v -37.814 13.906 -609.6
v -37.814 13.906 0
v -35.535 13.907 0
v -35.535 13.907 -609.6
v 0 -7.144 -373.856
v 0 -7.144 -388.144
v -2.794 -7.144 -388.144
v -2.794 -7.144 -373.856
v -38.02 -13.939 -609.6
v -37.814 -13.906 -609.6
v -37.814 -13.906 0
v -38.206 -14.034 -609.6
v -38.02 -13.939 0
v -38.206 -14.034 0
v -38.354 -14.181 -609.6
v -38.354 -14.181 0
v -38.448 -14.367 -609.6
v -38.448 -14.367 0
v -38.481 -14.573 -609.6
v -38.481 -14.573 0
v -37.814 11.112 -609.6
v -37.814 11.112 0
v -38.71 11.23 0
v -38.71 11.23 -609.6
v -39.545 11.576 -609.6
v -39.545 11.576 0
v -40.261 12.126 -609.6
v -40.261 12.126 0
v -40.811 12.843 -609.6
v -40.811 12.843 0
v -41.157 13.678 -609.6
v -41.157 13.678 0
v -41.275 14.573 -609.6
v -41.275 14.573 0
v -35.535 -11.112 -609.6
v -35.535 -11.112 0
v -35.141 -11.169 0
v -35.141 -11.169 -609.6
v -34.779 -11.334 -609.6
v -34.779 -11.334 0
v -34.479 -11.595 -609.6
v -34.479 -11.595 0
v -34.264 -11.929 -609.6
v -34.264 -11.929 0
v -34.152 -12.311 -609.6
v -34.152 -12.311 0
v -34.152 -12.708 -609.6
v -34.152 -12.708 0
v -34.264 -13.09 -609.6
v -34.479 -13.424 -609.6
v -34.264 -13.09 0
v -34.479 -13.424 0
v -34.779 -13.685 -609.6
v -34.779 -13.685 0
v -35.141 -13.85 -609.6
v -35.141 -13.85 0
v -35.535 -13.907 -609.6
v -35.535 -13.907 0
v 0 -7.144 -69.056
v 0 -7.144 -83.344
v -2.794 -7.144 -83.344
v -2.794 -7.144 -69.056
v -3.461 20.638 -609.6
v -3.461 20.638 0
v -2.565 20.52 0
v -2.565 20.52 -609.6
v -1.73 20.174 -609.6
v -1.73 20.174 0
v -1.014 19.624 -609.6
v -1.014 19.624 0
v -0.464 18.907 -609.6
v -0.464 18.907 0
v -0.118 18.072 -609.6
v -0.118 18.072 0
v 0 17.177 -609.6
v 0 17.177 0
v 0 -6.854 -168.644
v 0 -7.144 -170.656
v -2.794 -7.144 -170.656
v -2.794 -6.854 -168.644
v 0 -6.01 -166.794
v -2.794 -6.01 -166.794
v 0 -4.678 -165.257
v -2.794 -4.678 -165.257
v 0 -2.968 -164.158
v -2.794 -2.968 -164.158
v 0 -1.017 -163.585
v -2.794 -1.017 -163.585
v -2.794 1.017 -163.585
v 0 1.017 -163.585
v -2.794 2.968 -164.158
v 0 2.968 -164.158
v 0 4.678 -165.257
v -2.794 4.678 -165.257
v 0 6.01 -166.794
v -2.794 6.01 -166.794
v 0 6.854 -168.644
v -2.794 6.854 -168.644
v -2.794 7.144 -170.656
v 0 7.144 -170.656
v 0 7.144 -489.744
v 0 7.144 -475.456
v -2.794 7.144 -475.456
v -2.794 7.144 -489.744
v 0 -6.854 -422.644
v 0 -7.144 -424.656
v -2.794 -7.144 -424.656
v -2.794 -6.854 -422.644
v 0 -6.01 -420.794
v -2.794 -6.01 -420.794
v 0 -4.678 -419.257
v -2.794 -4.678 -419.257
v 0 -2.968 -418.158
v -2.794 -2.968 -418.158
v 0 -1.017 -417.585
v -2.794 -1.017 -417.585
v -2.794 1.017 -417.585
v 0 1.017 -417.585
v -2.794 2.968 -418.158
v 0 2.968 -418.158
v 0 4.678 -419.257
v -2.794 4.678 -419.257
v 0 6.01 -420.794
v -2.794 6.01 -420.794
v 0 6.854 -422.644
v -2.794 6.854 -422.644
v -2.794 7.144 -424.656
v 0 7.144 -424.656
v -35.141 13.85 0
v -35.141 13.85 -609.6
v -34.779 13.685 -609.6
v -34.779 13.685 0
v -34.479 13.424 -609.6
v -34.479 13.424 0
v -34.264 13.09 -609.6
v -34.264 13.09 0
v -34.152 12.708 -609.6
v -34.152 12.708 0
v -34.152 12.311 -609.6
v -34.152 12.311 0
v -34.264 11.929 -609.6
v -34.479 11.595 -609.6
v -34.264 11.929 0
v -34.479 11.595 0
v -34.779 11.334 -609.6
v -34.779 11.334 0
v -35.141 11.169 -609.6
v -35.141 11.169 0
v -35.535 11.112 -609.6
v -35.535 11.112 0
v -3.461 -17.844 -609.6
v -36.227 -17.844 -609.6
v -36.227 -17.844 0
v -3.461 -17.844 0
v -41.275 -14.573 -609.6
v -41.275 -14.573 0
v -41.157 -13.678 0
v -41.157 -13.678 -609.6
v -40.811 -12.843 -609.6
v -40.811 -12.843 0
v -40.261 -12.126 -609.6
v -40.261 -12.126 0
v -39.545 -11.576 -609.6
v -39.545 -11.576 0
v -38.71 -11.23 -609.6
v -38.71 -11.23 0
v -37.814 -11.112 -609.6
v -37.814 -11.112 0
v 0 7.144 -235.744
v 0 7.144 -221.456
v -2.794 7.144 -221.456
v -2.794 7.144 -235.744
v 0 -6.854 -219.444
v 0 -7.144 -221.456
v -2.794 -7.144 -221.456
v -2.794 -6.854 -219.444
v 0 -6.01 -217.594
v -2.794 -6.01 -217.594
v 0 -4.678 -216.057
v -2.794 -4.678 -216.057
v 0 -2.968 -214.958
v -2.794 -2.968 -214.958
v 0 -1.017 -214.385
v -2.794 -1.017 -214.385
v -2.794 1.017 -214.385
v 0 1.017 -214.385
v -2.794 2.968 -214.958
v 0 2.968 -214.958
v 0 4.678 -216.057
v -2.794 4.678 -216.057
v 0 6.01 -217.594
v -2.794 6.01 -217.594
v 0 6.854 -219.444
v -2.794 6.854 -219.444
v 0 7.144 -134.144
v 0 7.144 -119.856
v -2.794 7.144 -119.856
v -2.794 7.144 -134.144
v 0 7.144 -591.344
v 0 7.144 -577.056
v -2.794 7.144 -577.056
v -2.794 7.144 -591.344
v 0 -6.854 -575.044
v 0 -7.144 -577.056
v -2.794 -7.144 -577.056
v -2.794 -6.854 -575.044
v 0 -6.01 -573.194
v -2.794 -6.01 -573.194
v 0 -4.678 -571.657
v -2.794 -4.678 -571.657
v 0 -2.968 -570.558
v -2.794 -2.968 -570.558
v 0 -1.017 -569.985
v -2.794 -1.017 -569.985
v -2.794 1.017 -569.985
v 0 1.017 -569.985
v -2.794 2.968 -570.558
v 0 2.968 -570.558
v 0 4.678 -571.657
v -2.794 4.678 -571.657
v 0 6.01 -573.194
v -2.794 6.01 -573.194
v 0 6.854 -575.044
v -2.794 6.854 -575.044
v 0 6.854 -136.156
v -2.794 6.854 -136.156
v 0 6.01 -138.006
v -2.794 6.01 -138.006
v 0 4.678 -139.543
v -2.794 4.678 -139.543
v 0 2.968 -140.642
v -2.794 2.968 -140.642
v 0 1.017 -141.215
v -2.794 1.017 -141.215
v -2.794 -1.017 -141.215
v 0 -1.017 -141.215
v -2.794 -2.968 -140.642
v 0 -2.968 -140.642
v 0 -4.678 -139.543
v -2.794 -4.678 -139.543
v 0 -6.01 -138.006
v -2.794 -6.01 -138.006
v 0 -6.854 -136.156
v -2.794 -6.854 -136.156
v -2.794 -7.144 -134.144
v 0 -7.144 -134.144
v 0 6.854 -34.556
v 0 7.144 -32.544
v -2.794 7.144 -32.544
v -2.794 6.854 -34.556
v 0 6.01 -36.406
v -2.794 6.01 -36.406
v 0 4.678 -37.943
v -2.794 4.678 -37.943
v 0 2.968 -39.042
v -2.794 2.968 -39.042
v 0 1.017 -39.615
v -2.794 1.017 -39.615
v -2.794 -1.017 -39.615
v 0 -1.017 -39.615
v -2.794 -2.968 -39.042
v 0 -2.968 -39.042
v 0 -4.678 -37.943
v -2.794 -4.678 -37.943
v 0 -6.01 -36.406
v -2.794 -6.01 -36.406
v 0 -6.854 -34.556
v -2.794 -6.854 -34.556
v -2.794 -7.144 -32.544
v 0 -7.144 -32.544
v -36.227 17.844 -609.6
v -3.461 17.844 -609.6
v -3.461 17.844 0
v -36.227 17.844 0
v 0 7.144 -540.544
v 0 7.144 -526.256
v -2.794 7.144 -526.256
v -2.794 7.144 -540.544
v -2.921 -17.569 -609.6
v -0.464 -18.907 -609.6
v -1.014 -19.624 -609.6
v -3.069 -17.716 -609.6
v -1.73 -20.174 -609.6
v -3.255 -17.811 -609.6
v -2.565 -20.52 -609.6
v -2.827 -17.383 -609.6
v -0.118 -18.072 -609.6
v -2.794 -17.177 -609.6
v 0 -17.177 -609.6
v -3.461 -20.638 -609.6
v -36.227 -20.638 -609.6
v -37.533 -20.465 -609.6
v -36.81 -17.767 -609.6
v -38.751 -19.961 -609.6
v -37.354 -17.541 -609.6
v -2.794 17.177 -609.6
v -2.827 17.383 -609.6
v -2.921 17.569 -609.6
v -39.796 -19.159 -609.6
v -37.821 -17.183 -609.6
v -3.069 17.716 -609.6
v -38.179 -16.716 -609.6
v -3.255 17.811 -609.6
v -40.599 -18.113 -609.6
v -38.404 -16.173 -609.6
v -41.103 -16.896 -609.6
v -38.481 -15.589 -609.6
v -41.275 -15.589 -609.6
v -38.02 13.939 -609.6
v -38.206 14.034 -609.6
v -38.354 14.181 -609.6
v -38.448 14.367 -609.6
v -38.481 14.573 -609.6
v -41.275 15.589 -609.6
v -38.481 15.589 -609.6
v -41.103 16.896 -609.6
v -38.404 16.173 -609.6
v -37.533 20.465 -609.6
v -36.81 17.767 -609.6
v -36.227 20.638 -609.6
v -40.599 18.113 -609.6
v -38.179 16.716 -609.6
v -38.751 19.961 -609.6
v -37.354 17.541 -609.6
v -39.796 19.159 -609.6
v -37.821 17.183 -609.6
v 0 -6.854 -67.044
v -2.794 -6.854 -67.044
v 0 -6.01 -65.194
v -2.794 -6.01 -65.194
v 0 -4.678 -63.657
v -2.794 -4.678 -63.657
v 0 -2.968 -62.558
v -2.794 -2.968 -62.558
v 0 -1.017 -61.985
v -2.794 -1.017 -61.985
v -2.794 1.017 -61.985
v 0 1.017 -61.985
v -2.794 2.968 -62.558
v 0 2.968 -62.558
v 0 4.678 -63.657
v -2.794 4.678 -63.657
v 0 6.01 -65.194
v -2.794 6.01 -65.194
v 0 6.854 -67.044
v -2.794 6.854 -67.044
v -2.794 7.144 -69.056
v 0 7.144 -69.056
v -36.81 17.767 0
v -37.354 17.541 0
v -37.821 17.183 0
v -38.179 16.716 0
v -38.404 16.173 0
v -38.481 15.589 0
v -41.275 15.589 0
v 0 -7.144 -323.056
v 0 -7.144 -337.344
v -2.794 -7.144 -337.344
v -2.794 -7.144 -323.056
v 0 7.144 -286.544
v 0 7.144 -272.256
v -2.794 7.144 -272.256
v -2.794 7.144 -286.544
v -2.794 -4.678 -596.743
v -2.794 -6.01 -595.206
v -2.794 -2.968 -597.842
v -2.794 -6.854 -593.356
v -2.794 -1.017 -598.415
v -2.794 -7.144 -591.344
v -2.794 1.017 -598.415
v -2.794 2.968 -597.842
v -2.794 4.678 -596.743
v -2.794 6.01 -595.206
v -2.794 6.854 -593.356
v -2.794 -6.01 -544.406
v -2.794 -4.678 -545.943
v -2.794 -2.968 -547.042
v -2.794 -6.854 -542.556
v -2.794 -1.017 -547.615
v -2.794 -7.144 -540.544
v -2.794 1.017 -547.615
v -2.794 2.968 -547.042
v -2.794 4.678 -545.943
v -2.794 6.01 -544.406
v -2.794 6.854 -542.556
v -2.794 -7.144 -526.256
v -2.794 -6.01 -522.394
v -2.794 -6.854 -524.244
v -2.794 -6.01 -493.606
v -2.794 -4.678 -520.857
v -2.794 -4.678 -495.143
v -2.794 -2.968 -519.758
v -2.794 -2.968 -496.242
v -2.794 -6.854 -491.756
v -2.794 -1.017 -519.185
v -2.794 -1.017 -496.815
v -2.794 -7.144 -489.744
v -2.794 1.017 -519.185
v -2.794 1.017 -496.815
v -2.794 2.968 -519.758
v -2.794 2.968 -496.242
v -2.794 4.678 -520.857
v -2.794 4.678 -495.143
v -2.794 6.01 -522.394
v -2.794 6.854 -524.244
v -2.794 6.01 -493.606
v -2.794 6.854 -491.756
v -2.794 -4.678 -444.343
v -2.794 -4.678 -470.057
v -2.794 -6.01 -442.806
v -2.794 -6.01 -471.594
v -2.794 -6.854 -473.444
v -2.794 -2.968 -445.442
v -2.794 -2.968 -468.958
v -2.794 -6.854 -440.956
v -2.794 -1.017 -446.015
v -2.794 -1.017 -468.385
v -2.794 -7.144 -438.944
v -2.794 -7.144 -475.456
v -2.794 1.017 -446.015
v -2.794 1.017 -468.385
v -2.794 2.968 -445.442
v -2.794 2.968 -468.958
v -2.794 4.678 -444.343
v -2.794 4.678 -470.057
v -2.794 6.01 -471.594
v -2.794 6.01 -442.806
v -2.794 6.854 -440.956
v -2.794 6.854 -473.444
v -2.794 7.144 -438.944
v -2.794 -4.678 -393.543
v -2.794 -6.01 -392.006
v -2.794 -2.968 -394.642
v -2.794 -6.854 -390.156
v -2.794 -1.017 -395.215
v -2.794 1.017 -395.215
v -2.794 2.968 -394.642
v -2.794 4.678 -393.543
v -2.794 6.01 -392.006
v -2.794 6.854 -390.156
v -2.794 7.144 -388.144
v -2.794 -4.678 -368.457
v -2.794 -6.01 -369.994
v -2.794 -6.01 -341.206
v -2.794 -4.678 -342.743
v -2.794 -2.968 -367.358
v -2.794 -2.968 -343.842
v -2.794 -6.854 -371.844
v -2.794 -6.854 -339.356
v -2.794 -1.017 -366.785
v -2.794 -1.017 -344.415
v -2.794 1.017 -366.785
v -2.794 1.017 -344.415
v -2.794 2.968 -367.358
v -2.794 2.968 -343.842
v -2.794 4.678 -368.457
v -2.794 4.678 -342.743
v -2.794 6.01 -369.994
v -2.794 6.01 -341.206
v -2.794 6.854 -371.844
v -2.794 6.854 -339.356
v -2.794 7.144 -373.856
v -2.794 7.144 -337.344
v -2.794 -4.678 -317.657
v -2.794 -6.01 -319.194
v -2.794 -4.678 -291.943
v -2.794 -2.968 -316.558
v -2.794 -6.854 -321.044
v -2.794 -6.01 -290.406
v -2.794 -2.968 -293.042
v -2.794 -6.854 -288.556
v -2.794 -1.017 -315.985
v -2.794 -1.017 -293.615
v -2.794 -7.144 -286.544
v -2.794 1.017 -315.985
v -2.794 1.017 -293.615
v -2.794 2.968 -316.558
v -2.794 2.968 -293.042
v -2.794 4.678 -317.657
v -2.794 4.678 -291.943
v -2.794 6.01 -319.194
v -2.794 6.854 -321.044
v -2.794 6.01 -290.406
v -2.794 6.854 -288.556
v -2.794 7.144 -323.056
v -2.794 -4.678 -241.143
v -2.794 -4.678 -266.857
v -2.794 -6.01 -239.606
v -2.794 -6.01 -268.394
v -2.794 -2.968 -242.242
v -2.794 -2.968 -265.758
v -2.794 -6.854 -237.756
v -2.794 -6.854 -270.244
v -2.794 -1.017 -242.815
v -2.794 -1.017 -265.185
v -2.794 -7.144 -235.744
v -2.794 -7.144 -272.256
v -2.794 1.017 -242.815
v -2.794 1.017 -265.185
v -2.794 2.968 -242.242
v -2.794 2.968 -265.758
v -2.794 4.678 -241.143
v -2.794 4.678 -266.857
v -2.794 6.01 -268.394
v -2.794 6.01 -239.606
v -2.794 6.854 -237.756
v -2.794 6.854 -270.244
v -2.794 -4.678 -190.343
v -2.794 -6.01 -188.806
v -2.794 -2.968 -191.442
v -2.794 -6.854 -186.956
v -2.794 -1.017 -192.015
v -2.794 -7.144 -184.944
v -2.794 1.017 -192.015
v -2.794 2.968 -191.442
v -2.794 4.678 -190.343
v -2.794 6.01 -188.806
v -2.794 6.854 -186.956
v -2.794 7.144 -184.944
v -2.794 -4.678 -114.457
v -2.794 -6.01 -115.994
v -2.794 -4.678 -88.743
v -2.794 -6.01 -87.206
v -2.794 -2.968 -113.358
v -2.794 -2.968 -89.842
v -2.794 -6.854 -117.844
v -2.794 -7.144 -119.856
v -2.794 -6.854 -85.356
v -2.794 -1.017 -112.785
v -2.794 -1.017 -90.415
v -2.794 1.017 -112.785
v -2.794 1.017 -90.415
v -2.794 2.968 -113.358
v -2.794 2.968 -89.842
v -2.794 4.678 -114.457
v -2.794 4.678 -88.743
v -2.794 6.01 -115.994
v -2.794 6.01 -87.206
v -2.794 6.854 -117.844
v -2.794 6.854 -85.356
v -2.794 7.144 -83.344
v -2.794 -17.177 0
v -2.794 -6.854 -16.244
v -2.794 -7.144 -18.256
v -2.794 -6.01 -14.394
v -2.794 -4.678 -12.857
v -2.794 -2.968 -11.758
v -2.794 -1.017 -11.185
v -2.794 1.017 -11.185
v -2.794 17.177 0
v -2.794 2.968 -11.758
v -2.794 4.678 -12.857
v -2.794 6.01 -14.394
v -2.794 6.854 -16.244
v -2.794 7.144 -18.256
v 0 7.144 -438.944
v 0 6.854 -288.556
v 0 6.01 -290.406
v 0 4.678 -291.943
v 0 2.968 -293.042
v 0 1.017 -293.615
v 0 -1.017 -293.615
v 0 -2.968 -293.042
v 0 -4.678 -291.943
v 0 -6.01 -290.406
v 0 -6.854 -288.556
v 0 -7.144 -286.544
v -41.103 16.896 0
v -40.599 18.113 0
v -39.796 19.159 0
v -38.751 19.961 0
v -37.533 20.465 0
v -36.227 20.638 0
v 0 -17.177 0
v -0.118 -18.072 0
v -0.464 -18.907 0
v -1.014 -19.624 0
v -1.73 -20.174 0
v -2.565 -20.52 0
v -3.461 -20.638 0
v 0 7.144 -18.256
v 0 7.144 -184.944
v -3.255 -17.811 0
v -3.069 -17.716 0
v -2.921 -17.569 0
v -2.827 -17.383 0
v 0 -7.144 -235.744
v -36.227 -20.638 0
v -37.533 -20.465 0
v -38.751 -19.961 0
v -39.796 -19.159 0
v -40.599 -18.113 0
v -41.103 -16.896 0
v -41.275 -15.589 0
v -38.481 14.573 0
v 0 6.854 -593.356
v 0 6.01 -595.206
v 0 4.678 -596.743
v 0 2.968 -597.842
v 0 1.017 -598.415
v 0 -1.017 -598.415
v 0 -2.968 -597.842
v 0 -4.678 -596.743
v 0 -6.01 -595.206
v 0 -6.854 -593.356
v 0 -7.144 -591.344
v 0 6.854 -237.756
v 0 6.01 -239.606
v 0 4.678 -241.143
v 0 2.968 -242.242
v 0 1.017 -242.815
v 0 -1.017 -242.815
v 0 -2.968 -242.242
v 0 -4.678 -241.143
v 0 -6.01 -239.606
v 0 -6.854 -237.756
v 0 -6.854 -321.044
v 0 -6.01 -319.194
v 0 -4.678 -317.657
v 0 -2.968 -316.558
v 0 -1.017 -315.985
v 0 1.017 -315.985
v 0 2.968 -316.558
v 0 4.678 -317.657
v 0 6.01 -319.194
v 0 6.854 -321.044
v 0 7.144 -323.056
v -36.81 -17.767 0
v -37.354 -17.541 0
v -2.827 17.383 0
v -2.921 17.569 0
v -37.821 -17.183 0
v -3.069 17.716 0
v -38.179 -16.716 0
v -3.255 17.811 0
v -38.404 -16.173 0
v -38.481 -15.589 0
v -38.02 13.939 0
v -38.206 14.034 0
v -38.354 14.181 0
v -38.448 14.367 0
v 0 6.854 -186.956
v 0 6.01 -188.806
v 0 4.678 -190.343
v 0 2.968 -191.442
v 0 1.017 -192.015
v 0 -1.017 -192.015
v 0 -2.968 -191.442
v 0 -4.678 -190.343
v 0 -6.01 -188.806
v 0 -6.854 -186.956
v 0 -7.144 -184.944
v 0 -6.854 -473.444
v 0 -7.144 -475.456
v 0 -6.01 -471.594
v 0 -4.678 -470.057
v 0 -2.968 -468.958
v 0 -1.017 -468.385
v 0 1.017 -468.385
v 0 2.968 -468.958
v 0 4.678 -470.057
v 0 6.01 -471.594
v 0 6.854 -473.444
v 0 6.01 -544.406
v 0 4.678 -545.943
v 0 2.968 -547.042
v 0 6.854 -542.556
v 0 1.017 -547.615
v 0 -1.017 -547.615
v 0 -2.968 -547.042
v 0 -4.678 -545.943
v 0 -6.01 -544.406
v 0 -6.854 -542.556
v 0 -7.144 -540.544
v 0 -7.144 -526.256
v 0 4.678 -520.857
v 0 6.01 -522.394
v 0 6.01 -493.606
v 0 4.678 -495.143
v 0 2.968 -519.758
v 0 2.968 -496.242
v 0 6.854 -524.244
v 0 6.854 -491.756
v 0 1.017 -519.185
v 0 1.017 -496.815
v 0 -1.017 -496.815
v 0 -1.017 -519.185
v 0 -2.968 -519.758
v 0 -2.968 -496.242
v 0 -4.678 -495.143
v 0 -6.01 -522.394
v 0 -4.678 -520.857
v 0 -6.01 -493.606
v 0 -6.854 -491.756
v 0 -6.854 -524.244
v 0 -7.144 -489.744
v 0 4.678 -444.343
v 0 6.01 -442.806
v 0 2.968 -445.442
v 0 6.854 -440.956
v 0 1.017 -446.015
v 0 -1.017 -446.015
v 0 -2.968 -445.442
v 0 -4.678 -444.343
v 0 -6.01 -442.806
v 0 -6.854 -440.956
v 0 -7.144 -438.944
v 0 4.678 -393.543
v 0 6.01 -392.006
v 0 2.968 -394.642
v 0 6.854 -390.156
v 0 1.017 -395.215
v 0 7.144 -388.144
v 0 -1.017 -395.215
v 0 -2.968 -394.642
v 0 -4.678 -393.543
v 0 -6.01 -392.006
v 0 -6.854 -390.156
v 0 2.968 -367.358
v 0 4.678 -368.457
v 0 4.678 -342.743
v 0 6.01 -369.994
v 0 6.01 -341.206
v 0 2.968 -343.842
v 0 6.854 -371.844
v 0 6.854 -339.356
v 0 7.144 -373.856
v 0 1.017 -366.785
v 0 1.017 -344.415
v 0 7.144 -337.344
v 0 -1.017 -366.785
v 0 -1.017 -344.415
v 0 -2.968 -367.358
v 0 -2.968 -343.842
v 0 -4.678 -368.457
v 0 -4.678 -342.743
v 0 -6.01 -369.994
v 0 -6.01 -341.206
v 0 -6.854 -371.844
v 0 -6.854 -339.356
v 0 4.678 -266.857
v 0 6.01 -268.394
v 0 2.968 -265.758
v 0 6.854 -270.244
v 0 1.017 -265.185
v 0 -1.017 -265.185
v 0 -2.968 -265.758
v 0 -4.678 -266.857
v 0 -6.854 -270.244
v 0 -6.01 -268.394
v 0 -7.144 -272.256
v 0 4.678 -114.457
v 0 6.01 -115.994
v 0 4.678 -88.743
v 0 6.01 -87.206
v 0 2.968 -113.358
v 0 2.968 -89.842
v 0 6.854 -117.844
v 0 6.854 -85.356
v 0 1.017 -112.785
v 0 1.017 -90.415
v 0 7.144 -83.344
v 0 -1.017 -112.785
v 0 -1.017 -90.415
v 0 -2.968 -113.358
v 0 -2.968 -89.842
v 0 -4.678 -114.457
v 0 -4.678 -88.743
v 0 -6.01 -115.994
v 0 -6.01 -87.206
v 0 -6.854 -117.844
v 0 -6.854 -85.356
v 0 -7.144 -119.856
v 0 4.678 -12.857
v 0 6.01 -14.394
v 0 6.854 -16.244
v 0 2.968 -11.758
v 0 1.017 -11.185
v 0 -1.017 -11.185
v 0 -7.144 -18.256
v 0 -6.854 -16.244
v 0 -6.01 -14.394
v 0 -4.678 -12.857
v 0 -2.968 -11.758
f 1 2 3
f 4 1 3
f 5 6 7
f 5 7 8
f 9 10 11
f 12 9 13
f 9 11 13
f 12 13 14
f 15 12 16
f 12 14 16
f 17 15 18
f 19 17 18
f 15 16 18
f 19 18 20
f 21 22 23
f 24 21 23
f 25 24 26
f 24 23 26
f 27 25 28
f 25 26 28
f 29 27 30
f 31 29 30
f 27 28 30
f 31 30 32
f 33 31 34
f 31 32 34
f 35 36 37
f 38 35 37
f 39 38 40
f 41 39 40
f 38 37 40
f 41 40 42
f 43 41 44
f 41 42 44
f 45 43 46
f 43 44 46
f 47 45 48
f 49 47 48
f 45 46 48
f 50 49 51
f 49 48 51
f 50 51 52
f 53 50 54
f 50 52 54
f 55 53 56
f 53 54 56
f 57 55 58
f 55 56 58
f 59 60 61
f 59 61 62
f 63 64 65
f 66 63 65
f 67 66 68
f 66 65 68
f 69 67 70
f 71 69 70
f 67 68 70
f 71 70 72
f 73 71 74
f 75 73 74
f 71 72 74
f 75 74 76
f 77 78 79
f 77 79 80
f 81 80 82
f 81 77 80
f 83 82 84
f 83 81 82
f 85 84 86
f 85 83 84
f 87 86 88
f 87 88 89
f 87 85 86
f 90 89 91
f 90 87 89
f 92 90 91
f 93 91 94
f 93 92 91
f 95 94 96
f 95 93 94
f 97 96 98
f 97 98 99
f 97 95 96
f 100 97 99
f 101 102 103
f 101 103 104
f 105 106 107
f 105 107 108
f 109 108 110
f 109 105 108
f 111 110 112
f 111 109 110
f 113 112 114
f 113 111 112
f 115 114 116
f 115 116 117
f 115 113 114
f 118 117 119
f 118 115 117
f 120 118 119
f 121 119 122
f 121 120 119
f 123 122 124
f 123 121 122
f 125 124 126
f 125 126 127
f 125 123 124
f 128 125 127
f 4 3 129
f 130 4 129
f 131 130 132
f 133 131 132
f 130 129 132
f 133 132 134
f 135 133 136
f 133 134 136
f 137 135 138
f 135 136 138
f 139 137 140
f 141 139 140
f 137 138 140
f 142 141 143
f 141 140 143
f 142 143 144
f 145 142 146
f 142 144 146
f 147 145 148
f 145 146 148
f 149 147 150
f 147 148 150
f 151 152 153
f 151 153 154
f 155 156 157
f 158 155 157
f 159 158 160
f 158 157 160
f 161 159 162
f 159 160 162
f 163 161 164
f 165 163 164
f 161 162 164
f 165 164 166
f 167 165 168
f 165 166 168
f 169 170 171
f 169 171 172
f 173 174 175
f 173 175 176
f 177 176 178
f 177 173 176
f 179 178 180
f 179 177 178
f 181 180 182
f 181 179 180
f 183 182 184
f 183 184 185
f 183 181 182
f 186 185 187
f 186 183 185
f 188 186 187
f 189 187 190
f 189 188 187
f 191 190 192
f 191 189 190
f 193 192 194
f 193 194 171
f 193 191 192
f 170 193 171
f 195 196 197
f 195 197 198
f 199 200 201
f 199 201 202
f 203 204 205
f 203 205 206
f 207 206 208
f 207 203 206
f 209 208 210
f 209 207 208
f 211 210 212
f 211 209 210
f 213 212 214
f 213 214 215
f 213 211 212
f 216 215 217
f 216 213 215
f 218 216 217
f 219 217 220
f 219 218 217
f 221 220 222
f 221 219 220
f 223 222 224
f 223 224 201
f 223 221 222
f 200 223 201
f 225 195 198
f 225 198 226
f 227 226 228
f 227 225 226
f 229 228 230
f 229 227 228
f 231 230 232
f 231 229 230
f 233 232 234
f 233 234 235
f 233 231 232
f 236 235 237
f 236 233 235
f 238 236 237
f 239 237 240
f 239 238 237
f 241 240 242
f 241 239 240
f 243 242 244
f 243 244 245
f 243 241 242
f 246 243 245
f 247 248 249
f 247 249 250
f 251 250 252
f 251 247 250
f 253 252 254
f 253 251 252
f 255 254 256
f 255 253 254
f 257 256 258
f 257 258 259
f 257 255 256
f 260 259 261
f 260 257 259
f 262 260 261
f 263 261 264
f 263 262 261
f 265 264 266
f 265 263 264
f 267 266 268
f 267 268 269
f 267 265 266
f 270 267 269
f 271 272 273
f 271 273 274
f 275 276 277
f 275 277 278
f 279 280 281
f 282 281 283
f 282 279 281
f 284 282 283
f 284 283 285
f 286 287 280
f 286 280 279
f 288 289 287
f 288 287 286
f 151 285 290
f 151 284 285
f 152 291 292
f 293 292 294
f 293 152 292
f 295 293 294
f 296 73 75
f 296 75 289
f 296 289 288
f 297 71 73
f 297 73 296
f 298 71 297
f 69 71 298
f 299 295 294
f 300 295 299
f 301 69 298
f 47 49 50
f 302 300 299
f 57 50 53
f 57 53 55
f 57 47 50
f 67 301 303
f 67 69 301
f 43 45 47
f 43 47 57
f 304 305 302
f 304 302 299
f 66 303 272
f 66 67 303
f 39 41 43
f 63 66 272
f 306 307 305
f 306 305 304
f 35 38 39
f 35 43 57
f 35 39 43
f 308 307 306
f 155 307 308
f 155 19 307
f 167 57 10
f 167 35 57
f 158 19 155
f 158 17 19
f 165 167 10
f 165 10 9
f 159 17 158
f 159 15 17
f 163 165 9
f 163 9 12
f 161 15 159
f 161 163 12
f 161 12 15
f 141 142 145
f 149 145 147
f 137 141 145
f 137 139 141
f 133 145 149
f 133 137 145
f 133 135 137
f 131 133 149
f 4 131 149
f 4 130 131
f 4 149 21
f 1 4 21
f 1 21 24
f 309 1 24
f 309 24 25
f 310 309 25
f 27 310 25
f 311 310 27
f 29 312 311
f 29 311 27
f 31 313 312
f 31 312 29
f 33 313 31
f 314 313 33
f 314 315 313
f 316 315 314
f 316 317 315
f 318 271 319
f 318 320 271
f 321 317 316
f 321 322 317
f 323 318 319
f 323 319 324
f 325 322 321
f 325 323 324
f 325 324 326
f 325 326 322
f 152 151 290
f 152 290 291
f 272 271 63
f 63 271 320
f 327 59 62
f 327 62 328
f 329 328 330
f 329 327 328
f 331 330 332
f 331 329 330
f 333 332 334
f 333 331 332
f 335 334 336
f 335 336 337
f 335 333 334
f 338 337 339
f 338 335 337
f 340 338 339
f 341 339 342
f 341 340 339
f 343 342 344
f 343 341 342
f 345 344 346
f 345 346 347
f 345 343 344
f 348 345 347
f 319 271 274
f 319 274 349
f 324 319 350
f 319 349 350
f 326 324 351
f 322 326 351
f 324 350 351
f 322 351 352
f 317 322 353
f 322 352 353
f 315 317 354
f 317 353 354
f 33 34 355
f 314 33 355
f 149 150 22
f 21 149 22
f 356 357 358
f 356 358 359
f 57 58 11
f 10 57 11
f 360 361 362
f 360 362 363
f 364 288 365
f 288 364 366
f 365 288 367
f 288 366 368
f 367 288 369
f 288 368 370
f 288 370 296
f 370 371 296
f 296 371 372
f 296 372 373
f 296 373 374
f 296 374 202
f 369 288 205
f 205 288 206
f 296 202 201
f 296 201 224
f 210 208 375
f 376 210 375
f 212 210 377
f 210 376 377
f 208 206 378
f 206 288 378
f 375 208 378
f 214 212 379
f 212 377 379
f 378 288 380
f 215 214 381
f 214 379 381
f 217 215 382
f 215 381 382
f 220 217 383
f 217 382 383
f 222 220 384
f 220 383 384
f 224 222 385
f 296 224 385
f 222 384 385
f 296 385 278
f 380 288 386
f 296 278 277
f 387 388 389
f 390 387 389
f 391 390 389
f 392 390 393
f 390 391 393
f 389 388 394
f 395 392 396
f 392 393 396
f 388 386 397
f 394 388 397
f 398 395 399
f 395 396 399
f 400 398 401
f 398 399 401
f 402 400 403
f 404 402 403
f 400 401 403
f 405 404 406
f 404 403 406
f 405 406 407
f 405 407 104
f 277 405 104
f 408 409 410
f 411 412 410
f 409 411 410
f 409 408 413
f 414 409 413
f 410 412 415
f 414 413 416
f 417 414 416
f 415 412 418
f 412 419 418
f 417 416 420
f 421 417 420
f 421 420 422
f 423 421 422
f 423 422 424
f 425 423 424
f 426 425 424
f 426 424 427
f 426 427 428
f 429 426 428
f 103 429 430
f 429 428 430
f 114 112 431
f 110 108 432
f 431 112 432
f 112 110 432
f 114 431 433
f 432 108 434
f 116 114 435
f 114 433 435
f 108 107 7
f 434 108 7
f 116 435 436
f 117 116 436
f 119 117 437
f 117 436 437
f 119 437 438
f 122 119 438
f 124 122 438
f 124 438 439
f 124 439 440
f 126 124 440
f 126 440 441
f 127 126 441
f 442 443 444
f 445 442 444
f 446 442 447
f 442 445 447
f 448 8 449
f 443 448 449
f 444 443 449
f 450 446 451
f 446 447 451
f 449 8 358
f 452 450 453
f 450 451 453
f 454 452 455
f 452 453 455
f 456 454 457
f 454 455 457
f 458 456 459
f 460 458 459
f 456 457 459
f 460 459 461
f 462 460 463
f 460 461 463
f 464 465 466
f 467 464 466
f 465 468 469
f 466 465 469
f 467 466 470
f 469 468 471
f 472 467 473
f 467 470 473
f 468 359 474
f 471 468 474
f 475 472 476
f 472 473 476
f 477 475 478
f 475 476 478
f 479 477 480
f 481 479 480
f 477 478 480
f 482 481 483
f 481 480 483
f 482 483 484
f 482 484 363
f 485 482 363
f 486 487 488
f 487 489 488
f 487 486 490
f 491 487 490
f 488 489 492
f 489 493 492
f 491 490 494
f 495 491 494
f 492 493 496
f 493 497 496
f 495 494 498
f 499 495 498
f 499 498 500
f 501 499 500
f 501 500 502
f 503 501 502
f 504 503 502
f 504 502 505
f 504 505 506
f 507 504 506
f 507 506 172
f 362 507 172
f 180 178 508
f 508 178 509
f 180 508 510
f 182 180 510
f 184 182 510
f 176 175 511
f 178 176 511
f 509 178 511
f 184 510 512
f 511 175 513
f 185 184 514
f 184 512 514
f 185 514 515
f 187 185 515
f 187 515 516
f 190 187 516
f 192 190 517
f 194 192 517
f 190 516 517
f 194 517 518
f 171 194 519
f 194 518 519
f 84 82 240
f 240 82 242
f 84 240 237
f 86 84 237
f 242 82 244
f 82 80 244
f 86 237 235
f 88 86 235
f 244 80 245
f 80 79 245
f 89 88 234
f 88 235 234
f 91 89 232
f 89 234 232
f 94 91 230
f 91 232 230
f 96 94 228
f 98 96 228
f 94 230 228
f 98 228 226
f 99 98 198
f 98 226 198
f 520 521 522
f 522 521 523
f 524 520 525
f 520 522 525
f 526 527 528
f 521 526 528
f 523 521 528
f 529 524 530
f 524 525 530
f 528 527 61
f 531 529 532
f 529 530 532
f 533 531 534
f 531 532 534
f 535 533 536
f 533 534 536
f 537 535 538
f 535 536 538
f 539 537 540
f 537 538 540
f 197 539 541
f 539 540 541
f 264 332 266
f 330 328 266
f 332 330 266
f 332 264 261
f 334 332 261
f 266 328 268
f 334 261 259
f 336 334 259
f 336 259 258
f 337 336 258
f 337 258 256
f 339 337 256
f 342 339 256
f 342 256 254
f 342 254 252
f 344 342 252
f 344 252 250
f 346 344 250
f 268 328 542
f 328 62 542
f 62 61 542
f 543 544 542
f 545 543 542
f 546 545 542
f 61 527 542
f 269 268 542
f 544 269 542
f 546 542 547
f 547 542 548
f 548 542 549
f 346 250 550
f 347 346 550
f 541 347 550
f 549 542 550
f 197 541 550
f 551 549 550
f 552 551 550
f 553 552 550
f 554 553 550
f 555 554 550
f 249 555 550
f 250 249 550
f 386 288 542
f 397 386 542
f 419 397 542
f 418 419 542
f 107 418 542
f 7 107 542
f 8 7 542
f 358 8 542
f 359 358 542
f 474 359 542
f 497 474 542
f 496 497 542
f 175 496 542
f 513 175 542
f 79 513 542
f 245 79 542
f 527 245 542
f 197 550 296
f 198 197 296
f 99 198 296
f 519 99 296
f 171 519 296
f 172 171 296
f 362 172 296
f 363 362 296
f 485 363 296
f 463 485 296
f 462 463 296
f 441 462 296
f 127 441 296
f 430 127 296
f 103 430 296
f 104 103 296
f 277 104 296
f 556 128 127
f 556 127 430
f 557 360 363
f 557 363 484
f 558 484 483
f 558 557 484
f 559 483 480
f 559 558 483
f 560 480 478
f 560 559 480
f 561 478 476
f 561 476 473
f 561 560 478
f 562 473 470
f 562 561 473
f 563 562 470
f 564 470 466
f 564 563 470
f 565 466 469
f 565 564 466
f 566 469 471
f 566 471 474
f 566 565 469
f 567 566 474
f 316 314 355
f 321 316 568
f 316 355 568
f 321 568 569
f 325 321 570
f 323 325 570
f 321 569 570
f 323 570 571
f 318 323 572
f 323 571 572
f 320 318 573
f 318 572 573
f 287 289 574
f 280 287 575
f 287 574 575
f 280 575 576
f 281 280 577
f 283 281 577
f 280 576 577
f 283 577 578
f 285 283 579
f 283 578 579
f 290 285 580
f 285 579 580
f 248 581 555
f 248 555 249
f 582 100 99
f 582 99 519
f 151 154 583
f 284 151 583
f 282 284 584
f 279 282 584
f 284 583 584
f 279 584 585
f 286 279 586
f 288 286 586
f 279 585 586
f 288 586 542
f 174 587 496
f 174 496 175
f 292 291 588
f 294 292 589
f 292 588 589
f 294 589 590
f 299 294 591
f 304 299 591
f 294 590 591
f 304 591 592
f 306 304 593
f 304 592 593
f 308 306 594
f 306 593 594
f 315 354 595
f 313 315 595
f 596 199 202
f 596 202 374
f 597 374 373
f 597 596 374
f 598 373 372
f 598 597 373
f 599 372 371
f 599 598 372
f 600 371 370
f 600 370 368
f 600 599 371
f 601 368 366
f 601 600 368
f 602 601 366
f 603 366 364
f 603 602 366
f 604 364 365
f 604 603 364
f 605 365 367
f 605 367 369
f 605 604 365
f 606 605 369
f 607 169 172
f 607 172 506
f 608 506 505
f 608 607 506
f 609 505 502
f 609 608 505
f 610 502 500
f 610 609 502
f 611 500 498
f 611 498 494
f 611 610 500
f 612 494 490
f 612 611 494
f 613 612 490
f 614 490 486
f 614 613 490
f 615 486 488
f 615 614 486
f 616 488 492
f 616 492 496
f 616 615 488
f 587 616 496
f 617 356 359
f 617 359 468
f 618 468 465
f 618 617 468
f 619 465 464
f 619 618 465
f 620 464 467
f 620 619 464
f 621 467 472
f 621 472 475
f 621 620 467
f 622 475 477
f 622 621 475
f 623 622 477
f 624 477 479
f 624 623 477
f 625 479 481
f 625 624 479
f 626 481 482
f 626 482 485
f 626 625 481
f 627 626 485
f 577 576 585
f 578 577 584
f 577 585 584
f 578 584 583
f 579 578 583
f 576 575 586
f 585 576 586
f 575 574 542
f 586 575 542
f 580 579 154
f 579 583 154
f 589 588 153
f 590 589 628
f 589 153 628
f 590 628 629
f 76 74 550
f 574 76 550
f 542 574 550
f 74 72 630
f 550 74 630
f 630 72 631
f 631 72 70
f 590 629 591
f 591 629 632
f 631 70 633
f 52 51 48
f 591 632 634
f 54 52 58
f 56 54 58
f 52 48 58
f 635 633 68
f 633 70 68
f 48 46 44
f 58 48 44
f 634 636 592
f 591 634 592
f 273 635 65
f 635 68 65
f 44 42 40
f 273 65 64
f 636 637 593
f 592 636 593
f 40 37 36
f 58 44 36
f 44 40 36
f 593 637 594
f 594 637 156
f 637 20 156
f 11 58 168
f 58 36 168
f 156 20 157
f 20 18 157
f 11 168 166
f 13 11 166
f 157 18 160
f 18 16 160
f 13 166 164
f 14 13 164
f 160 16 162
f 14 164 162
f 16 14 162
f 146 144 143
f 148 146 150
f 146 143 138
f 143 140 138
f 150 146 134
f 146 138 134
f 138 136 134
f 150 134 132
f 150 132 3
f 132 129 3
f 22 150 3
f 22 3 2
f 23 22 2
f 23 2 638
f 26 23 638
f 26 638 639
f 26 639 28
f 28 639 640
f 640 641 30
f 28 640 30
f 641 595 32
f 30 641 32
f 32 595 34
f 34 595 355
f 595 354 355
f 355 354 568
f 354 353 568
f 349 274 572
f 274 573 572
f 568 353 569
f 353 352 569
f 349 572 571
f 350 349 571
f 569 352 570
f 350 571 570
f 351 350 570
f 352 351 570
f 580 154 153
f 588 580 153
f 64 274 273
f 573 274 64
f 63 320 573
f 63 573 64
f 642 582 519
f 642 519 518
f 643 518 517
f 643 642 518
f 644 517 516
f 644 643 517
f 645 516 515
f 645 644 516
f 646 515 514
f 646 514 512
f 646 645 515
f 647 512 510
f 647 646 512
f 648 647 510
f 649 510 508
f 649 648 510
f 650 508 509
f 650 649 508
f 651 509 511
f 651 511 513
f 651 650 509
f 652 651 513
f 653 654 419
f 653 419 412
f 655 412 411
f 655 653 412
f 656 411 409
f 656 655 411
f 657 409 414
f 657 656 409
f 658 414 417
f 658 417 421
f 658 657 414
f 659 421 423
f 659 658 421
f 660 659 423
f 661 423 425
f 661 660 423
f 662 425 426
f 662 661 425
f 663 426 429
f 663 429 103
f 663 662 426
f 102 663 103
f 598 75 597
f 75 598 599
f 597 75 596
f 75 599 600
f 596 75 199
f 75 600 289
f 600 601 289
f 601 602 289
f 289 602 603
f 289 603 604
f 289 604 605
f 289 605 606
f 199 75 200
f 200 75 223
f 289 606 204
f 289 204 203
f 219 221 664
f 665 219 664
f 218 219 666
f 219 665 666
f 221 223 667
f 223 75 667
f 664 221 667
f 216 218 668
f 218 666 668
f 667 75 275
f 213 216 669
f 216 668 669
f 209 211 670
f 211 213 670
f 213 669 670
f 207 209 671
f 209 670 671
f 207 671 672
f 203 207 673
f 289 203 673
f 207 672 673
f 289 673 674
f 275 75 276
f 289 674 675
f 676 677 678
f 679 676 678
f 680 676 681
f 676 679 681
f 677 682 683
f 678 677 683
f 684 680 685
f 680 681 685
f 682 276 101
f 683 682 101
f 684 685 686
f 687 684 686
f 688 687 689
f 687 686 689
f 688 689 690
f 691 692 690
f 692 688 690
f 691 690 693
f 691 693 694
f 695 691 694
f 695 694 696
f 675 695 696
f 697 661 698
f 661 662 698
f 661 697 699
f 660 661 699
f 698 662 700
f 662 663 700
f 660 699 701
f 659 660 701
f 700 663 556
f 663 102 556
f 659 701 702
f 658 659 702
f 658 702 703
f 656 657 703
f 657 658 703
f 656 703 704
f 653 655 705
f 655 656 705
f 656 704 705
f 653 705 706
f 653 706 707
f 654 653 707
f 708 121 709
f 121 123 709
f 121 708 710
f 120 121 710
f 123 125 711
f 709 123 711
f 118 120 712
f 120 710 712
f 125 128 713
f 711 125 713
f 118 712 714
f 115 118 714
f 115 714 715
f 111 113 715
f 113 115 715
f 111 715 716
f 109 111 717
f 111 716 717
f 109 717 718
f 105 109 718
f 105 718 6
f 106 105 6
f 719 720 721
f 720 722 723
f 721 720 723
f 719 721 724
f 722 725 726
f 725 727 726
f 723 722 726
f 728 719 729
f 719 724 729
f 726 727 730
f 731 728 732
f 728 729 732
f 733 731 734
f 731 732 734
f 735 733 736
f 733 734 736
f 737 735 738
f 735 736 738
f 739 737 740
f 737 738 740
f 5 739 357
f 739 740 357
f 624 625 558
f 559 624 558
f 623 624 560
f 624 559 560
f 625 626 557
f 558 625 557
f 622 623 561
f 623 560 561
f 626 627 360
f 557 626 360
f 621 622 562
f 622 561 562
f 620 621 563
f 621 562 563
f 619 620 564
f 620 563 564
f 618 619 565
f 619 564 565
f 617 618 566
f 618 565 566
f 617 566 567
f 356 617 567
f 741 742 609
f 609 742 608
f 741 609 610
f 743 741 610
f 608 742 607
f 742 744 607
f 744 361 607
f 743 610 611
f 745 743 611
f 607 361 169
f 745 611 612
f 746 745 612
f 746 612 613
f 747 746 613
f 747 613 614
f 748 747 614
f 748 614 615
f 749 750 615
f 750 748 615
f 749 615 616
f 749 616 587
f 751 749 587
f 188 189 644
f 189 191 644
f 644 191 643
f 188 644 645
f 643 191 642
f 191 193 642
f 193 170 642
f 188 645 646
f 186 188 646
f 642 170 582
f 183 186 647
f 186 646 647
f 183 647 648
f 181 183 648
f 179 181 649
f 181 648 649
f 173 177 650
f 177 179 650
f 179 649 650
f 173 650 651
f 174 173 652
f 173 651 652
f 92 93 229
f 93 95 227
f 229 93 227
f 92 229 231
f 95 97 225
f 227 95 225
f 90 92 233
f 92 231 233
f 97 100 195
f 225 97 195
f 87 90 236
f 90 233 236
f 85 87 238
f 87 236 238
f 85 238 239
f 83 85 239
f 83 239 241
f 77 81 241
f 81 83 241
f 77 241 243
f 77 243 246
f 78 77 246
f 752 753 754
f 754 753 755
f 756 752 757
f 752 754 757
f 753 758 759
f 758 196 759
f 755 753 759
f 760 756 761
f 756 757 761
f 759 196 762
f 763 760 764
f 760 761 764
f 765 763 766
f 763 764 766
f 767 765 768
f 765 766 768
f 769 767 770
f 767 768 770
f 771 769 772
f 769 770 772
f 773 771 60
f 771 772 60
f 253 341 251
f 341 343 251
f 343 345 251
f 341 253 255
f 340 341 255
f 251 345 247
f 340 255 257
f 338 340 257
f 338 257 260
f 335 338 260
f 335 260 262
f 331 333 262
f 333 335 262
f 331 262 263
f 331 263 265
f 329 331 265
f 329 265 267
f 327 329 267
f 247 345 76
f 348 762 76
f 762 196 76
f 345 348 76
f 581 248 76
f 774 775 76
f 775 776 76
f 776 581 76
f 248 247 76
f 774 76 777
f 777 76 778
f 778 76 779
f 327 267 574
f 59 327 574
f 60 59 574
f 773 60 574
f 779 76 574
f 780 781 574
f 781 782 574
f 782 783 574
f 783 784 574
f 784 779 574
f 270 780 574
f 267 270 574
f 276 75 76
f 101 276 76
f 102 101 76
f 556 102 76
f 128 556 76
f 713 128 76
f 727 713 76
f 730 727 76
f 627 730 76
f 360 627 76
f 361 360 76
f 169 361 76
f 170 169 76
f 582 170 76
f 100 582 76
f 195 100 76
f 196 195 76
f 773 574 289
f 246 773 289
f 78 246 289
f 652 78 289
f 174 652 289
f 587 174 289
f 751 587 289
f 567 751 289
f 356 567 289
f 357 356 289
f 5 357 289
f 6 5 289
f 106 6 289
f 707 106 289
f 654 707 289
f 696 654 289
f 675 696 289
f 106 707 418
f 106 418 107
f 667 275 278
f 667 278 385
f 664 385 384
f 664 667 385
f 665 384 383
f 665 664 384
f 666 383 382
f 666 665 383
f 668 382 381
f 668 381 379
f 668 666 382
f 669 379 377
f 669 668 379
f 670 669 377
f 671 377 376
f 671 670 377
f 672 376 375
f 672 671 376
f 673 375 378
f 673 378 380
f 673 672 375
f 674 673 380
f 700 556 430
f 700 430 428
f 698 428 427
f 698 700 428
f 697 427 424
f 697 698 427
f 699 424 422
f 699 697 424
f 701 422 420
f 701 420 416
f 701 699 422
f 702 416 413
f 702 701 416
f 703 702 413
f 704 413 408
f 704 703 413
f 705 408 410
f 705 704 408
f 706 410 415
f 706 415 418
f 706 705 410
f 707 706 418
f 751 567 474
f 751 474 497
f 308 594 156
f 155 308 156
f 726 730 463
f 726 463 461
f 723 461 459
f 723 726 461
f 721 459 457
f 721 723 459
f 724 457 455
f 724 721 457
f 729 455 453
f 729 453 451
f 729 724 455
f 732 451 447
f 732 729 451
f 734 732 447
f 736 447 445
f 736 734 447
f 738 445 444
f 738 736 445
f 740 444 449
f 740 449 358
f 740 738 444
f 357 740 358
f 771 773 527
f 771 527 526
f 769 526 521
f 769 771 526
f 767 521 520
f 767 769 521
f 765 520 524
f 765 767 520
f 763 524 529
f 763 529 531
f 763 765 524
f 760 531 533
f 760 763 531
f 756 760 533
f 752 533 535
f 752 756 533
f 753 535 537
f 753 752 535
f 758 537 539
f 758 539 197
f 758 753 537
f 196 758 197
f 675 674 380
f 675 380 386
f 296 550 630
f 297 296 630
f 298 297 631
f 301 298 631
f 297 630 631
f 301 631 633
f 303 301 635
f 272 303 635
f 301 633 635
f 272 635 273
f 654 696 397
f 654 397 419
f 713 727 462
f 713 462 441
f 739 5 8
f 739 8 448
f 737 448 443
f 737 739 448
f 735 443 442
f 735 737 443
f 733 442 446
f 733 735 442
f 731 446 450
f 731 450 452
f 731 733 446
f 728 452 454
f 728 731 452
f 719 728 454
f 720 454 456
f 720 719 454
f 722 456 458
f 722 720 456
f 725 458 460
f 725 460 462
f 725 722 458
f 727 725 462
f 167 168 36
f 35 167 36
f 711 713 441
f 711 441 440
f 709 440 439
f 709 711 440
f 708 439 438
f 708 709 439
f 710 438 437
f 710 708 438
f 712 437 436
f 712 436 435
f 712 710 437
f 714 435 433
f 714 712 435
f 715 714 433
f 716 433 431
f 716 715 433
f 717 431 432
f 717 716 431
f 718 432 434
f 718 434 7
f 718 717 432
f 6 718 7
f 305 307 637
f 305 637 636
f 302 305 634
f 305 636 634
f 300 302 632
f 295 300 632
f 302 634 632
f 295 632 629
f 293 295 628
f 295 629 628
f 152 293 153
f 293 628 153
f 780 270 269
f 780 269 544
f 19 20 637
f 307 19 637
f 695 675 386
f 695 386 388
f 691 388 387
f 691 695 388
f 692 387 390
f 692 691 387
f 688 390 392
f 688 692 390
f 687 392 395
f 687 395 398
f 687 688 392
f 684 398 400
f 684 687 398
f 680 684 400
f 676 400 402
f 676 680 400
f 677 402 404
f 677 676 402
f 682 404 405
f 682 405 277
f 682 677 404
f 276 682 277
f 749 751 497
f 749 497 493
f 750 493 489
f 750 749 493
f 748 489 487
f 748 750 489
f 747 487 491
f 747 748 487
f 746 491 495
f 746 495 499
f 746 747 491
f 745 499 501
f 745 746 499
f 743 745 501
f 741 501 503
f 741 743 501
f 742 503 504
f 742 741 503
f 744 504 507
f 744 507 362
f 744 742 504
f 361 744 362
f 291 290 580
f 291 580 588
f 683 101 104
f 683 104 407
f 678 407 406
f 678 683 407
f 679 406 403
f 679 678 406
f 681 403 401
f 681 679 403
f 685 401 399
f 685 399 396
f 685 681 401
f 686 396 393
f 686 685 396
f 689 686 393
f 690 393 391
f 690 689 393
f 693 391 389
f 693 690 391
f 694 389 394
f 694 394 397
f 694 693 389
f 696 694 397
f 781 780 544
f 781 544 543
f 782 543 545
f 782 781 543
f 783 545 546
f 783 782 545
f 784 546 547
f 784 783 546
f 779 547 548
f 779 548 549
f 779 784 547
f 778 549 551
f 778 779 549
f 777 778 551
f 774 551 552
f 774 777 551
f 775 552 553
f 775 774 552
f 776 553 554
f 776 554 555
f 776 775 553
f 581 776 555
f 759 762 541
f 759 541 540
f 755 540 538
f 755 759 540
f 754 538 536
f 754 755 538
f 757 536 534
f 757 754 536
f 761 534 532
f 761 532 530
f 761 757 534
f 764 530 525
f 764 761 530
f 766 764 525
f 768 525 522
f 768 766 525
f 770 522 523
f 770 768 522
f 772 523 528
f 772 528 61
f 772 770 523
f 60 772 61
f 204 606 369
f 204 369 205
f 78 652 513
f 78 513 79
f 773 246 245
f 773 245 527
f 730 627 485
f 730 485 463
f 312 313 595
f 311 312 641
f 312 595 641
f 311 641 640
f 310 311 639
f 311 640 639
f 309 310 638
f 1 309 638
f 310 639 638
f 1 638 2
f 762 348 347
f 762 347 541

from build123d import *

# Parameters (mm, degrees)
BOSS_EXTRUDE1_DEPTH = 609.6
CUT_EXTRUDE1_DEPTH  = 2.794
LPATTERN1_COUNT     = 12
LPATTERN1_PITCH     = 50.8


with BuildPart() as part:
    # Sketch1 → Boss-Extrude1 (new body)
    with BuildSketch(Plane.XY):
        with BuildLine():
            Line((-36.22675, 20.6375), (-3.46075, 20.6375))
            ThreePointArc((-3.46075, 20.6375), (-1.013630207, 19.623869793), (0, 17.17675))
            Line((0, 17.17675), (0, -17.17675))
            ThreePointArc((0, -17.17675), (-1.013630207, -19.623869793), (-3.46075, -20.6375))
            Line((-3.46075, -20.6375), (-36.22675, -20.6375))
            ThreePointArc((-36.22675, -20.6375), (-39.796401808, -19.158901808), (-41.275, -15.58925))
            Line((-41.275, -15.58925), (-41.275, -14.57325))
            ThreePointArc((-41.275, -14.57325), (-40.261369793, -12.126130207), (-37.81425, -11.1125))
            Line((-37.81425, -11.1125), (-35.5346, -11.1125))
            ThreePointArc((-35.5346, -11.1125), (-34.1376, -12.5095), (-35.5346, -13.9065))
            Line((-35.5346, -13.9065), (-37.81425, -13.9065))
            ThreePointArc((-37.81425, -13.9065), (-38.285713446, -14.101786554), (-38.481, -14.57325))
            Line((-38.481, -14.57325), (-38.481, -15.58925))
            ThreePointArc((-38.481, -15.58925), (-37.820745461, -17.183245461), (-36.22675, -17.8435))
            Line((-36.22675, -17.8435), (-3.46075, -17.8435))
            ThreePointArc((-3.46075, -17.8435), (-2.989286554, -17.648213446), (-2.794, -17.17675))
            Line((-2.794, -17.17675), (-2.794, 17.17675))
            ThreePointArc((-2.794, 17.17675), (-2.989286554, 17.648213446), (-3.46075, 17.8435))
            Line((-3.46075, 17.8435), (-36.22675, 17.8435))
            ThreePointArc((-36.22675, 17.8435), (-37.820745461, 17.183245461), (-38.481, 15.58925))
            Line((-38.481, 15.58925), (-38.481, 14.57325))
            ThreePointArc((-38.481, 14.57325), (-38.285713446, 14.101786554), (-37.81425, 13.9065))
            Line((-37.81425, 13.9065), (-35.5346, 13.9065))
            ThreePointArc((-35.5346, 13.9065), (-34.1376, 12.5095), (-35.5346, 11.1125))
            Line((-35.5346, 11.1125), (-37.81425, 11.1125))
            ThreePointArc((-37.81425, 11.1125), (-40.261369793, 12.126130207), (-41.275, 14.57325))
            Line((-41.275, 14.57325), (-41.275, 15.58925))
            ThreePointArc((-41.275, 15.58925), (-39.796401808, 19.158901808), (-36.22675, 20.6375))
        make_face()
    extrude(amount=-BOSS_EXTRUDE1_DEPTH)

    # Sketch2 → Cut-Extrude1 (cut)
    with BuildSketch(Plane(origin=(0, 0, 0), x_dir=(0, 0, -1), z_dir=(1, 0, 0))):
        with BuildLine():
            Line((18.25625, 7.14375), (32.54375, 7.14375))
            ThreePointArc((32.54375, 7.14375), (39.6875, 0), (32.54375, -7.14375))
            Line((32.54375, -7.14375), (18.25625, -7.14375))
            ThreePointArc((18.25625, -7.14375), (11.1125, 0), (18.25625, 7.14375))
        make_face()
    cut_extrude1 = extrude(amount=-CUT_EXTRUDE1_DEPTH, mode=Mode.SUBTRACT)

    # LPattern1: Cut-Extrude1 ×12
    with Locations(*[(0, 0, -i * LPATTERN1_PITCH) for i in range(1, LPATTERN1_COUNT)]):
        add(cut_extrude1, mode=Mode.SUBTRACT)


solid = part.part
